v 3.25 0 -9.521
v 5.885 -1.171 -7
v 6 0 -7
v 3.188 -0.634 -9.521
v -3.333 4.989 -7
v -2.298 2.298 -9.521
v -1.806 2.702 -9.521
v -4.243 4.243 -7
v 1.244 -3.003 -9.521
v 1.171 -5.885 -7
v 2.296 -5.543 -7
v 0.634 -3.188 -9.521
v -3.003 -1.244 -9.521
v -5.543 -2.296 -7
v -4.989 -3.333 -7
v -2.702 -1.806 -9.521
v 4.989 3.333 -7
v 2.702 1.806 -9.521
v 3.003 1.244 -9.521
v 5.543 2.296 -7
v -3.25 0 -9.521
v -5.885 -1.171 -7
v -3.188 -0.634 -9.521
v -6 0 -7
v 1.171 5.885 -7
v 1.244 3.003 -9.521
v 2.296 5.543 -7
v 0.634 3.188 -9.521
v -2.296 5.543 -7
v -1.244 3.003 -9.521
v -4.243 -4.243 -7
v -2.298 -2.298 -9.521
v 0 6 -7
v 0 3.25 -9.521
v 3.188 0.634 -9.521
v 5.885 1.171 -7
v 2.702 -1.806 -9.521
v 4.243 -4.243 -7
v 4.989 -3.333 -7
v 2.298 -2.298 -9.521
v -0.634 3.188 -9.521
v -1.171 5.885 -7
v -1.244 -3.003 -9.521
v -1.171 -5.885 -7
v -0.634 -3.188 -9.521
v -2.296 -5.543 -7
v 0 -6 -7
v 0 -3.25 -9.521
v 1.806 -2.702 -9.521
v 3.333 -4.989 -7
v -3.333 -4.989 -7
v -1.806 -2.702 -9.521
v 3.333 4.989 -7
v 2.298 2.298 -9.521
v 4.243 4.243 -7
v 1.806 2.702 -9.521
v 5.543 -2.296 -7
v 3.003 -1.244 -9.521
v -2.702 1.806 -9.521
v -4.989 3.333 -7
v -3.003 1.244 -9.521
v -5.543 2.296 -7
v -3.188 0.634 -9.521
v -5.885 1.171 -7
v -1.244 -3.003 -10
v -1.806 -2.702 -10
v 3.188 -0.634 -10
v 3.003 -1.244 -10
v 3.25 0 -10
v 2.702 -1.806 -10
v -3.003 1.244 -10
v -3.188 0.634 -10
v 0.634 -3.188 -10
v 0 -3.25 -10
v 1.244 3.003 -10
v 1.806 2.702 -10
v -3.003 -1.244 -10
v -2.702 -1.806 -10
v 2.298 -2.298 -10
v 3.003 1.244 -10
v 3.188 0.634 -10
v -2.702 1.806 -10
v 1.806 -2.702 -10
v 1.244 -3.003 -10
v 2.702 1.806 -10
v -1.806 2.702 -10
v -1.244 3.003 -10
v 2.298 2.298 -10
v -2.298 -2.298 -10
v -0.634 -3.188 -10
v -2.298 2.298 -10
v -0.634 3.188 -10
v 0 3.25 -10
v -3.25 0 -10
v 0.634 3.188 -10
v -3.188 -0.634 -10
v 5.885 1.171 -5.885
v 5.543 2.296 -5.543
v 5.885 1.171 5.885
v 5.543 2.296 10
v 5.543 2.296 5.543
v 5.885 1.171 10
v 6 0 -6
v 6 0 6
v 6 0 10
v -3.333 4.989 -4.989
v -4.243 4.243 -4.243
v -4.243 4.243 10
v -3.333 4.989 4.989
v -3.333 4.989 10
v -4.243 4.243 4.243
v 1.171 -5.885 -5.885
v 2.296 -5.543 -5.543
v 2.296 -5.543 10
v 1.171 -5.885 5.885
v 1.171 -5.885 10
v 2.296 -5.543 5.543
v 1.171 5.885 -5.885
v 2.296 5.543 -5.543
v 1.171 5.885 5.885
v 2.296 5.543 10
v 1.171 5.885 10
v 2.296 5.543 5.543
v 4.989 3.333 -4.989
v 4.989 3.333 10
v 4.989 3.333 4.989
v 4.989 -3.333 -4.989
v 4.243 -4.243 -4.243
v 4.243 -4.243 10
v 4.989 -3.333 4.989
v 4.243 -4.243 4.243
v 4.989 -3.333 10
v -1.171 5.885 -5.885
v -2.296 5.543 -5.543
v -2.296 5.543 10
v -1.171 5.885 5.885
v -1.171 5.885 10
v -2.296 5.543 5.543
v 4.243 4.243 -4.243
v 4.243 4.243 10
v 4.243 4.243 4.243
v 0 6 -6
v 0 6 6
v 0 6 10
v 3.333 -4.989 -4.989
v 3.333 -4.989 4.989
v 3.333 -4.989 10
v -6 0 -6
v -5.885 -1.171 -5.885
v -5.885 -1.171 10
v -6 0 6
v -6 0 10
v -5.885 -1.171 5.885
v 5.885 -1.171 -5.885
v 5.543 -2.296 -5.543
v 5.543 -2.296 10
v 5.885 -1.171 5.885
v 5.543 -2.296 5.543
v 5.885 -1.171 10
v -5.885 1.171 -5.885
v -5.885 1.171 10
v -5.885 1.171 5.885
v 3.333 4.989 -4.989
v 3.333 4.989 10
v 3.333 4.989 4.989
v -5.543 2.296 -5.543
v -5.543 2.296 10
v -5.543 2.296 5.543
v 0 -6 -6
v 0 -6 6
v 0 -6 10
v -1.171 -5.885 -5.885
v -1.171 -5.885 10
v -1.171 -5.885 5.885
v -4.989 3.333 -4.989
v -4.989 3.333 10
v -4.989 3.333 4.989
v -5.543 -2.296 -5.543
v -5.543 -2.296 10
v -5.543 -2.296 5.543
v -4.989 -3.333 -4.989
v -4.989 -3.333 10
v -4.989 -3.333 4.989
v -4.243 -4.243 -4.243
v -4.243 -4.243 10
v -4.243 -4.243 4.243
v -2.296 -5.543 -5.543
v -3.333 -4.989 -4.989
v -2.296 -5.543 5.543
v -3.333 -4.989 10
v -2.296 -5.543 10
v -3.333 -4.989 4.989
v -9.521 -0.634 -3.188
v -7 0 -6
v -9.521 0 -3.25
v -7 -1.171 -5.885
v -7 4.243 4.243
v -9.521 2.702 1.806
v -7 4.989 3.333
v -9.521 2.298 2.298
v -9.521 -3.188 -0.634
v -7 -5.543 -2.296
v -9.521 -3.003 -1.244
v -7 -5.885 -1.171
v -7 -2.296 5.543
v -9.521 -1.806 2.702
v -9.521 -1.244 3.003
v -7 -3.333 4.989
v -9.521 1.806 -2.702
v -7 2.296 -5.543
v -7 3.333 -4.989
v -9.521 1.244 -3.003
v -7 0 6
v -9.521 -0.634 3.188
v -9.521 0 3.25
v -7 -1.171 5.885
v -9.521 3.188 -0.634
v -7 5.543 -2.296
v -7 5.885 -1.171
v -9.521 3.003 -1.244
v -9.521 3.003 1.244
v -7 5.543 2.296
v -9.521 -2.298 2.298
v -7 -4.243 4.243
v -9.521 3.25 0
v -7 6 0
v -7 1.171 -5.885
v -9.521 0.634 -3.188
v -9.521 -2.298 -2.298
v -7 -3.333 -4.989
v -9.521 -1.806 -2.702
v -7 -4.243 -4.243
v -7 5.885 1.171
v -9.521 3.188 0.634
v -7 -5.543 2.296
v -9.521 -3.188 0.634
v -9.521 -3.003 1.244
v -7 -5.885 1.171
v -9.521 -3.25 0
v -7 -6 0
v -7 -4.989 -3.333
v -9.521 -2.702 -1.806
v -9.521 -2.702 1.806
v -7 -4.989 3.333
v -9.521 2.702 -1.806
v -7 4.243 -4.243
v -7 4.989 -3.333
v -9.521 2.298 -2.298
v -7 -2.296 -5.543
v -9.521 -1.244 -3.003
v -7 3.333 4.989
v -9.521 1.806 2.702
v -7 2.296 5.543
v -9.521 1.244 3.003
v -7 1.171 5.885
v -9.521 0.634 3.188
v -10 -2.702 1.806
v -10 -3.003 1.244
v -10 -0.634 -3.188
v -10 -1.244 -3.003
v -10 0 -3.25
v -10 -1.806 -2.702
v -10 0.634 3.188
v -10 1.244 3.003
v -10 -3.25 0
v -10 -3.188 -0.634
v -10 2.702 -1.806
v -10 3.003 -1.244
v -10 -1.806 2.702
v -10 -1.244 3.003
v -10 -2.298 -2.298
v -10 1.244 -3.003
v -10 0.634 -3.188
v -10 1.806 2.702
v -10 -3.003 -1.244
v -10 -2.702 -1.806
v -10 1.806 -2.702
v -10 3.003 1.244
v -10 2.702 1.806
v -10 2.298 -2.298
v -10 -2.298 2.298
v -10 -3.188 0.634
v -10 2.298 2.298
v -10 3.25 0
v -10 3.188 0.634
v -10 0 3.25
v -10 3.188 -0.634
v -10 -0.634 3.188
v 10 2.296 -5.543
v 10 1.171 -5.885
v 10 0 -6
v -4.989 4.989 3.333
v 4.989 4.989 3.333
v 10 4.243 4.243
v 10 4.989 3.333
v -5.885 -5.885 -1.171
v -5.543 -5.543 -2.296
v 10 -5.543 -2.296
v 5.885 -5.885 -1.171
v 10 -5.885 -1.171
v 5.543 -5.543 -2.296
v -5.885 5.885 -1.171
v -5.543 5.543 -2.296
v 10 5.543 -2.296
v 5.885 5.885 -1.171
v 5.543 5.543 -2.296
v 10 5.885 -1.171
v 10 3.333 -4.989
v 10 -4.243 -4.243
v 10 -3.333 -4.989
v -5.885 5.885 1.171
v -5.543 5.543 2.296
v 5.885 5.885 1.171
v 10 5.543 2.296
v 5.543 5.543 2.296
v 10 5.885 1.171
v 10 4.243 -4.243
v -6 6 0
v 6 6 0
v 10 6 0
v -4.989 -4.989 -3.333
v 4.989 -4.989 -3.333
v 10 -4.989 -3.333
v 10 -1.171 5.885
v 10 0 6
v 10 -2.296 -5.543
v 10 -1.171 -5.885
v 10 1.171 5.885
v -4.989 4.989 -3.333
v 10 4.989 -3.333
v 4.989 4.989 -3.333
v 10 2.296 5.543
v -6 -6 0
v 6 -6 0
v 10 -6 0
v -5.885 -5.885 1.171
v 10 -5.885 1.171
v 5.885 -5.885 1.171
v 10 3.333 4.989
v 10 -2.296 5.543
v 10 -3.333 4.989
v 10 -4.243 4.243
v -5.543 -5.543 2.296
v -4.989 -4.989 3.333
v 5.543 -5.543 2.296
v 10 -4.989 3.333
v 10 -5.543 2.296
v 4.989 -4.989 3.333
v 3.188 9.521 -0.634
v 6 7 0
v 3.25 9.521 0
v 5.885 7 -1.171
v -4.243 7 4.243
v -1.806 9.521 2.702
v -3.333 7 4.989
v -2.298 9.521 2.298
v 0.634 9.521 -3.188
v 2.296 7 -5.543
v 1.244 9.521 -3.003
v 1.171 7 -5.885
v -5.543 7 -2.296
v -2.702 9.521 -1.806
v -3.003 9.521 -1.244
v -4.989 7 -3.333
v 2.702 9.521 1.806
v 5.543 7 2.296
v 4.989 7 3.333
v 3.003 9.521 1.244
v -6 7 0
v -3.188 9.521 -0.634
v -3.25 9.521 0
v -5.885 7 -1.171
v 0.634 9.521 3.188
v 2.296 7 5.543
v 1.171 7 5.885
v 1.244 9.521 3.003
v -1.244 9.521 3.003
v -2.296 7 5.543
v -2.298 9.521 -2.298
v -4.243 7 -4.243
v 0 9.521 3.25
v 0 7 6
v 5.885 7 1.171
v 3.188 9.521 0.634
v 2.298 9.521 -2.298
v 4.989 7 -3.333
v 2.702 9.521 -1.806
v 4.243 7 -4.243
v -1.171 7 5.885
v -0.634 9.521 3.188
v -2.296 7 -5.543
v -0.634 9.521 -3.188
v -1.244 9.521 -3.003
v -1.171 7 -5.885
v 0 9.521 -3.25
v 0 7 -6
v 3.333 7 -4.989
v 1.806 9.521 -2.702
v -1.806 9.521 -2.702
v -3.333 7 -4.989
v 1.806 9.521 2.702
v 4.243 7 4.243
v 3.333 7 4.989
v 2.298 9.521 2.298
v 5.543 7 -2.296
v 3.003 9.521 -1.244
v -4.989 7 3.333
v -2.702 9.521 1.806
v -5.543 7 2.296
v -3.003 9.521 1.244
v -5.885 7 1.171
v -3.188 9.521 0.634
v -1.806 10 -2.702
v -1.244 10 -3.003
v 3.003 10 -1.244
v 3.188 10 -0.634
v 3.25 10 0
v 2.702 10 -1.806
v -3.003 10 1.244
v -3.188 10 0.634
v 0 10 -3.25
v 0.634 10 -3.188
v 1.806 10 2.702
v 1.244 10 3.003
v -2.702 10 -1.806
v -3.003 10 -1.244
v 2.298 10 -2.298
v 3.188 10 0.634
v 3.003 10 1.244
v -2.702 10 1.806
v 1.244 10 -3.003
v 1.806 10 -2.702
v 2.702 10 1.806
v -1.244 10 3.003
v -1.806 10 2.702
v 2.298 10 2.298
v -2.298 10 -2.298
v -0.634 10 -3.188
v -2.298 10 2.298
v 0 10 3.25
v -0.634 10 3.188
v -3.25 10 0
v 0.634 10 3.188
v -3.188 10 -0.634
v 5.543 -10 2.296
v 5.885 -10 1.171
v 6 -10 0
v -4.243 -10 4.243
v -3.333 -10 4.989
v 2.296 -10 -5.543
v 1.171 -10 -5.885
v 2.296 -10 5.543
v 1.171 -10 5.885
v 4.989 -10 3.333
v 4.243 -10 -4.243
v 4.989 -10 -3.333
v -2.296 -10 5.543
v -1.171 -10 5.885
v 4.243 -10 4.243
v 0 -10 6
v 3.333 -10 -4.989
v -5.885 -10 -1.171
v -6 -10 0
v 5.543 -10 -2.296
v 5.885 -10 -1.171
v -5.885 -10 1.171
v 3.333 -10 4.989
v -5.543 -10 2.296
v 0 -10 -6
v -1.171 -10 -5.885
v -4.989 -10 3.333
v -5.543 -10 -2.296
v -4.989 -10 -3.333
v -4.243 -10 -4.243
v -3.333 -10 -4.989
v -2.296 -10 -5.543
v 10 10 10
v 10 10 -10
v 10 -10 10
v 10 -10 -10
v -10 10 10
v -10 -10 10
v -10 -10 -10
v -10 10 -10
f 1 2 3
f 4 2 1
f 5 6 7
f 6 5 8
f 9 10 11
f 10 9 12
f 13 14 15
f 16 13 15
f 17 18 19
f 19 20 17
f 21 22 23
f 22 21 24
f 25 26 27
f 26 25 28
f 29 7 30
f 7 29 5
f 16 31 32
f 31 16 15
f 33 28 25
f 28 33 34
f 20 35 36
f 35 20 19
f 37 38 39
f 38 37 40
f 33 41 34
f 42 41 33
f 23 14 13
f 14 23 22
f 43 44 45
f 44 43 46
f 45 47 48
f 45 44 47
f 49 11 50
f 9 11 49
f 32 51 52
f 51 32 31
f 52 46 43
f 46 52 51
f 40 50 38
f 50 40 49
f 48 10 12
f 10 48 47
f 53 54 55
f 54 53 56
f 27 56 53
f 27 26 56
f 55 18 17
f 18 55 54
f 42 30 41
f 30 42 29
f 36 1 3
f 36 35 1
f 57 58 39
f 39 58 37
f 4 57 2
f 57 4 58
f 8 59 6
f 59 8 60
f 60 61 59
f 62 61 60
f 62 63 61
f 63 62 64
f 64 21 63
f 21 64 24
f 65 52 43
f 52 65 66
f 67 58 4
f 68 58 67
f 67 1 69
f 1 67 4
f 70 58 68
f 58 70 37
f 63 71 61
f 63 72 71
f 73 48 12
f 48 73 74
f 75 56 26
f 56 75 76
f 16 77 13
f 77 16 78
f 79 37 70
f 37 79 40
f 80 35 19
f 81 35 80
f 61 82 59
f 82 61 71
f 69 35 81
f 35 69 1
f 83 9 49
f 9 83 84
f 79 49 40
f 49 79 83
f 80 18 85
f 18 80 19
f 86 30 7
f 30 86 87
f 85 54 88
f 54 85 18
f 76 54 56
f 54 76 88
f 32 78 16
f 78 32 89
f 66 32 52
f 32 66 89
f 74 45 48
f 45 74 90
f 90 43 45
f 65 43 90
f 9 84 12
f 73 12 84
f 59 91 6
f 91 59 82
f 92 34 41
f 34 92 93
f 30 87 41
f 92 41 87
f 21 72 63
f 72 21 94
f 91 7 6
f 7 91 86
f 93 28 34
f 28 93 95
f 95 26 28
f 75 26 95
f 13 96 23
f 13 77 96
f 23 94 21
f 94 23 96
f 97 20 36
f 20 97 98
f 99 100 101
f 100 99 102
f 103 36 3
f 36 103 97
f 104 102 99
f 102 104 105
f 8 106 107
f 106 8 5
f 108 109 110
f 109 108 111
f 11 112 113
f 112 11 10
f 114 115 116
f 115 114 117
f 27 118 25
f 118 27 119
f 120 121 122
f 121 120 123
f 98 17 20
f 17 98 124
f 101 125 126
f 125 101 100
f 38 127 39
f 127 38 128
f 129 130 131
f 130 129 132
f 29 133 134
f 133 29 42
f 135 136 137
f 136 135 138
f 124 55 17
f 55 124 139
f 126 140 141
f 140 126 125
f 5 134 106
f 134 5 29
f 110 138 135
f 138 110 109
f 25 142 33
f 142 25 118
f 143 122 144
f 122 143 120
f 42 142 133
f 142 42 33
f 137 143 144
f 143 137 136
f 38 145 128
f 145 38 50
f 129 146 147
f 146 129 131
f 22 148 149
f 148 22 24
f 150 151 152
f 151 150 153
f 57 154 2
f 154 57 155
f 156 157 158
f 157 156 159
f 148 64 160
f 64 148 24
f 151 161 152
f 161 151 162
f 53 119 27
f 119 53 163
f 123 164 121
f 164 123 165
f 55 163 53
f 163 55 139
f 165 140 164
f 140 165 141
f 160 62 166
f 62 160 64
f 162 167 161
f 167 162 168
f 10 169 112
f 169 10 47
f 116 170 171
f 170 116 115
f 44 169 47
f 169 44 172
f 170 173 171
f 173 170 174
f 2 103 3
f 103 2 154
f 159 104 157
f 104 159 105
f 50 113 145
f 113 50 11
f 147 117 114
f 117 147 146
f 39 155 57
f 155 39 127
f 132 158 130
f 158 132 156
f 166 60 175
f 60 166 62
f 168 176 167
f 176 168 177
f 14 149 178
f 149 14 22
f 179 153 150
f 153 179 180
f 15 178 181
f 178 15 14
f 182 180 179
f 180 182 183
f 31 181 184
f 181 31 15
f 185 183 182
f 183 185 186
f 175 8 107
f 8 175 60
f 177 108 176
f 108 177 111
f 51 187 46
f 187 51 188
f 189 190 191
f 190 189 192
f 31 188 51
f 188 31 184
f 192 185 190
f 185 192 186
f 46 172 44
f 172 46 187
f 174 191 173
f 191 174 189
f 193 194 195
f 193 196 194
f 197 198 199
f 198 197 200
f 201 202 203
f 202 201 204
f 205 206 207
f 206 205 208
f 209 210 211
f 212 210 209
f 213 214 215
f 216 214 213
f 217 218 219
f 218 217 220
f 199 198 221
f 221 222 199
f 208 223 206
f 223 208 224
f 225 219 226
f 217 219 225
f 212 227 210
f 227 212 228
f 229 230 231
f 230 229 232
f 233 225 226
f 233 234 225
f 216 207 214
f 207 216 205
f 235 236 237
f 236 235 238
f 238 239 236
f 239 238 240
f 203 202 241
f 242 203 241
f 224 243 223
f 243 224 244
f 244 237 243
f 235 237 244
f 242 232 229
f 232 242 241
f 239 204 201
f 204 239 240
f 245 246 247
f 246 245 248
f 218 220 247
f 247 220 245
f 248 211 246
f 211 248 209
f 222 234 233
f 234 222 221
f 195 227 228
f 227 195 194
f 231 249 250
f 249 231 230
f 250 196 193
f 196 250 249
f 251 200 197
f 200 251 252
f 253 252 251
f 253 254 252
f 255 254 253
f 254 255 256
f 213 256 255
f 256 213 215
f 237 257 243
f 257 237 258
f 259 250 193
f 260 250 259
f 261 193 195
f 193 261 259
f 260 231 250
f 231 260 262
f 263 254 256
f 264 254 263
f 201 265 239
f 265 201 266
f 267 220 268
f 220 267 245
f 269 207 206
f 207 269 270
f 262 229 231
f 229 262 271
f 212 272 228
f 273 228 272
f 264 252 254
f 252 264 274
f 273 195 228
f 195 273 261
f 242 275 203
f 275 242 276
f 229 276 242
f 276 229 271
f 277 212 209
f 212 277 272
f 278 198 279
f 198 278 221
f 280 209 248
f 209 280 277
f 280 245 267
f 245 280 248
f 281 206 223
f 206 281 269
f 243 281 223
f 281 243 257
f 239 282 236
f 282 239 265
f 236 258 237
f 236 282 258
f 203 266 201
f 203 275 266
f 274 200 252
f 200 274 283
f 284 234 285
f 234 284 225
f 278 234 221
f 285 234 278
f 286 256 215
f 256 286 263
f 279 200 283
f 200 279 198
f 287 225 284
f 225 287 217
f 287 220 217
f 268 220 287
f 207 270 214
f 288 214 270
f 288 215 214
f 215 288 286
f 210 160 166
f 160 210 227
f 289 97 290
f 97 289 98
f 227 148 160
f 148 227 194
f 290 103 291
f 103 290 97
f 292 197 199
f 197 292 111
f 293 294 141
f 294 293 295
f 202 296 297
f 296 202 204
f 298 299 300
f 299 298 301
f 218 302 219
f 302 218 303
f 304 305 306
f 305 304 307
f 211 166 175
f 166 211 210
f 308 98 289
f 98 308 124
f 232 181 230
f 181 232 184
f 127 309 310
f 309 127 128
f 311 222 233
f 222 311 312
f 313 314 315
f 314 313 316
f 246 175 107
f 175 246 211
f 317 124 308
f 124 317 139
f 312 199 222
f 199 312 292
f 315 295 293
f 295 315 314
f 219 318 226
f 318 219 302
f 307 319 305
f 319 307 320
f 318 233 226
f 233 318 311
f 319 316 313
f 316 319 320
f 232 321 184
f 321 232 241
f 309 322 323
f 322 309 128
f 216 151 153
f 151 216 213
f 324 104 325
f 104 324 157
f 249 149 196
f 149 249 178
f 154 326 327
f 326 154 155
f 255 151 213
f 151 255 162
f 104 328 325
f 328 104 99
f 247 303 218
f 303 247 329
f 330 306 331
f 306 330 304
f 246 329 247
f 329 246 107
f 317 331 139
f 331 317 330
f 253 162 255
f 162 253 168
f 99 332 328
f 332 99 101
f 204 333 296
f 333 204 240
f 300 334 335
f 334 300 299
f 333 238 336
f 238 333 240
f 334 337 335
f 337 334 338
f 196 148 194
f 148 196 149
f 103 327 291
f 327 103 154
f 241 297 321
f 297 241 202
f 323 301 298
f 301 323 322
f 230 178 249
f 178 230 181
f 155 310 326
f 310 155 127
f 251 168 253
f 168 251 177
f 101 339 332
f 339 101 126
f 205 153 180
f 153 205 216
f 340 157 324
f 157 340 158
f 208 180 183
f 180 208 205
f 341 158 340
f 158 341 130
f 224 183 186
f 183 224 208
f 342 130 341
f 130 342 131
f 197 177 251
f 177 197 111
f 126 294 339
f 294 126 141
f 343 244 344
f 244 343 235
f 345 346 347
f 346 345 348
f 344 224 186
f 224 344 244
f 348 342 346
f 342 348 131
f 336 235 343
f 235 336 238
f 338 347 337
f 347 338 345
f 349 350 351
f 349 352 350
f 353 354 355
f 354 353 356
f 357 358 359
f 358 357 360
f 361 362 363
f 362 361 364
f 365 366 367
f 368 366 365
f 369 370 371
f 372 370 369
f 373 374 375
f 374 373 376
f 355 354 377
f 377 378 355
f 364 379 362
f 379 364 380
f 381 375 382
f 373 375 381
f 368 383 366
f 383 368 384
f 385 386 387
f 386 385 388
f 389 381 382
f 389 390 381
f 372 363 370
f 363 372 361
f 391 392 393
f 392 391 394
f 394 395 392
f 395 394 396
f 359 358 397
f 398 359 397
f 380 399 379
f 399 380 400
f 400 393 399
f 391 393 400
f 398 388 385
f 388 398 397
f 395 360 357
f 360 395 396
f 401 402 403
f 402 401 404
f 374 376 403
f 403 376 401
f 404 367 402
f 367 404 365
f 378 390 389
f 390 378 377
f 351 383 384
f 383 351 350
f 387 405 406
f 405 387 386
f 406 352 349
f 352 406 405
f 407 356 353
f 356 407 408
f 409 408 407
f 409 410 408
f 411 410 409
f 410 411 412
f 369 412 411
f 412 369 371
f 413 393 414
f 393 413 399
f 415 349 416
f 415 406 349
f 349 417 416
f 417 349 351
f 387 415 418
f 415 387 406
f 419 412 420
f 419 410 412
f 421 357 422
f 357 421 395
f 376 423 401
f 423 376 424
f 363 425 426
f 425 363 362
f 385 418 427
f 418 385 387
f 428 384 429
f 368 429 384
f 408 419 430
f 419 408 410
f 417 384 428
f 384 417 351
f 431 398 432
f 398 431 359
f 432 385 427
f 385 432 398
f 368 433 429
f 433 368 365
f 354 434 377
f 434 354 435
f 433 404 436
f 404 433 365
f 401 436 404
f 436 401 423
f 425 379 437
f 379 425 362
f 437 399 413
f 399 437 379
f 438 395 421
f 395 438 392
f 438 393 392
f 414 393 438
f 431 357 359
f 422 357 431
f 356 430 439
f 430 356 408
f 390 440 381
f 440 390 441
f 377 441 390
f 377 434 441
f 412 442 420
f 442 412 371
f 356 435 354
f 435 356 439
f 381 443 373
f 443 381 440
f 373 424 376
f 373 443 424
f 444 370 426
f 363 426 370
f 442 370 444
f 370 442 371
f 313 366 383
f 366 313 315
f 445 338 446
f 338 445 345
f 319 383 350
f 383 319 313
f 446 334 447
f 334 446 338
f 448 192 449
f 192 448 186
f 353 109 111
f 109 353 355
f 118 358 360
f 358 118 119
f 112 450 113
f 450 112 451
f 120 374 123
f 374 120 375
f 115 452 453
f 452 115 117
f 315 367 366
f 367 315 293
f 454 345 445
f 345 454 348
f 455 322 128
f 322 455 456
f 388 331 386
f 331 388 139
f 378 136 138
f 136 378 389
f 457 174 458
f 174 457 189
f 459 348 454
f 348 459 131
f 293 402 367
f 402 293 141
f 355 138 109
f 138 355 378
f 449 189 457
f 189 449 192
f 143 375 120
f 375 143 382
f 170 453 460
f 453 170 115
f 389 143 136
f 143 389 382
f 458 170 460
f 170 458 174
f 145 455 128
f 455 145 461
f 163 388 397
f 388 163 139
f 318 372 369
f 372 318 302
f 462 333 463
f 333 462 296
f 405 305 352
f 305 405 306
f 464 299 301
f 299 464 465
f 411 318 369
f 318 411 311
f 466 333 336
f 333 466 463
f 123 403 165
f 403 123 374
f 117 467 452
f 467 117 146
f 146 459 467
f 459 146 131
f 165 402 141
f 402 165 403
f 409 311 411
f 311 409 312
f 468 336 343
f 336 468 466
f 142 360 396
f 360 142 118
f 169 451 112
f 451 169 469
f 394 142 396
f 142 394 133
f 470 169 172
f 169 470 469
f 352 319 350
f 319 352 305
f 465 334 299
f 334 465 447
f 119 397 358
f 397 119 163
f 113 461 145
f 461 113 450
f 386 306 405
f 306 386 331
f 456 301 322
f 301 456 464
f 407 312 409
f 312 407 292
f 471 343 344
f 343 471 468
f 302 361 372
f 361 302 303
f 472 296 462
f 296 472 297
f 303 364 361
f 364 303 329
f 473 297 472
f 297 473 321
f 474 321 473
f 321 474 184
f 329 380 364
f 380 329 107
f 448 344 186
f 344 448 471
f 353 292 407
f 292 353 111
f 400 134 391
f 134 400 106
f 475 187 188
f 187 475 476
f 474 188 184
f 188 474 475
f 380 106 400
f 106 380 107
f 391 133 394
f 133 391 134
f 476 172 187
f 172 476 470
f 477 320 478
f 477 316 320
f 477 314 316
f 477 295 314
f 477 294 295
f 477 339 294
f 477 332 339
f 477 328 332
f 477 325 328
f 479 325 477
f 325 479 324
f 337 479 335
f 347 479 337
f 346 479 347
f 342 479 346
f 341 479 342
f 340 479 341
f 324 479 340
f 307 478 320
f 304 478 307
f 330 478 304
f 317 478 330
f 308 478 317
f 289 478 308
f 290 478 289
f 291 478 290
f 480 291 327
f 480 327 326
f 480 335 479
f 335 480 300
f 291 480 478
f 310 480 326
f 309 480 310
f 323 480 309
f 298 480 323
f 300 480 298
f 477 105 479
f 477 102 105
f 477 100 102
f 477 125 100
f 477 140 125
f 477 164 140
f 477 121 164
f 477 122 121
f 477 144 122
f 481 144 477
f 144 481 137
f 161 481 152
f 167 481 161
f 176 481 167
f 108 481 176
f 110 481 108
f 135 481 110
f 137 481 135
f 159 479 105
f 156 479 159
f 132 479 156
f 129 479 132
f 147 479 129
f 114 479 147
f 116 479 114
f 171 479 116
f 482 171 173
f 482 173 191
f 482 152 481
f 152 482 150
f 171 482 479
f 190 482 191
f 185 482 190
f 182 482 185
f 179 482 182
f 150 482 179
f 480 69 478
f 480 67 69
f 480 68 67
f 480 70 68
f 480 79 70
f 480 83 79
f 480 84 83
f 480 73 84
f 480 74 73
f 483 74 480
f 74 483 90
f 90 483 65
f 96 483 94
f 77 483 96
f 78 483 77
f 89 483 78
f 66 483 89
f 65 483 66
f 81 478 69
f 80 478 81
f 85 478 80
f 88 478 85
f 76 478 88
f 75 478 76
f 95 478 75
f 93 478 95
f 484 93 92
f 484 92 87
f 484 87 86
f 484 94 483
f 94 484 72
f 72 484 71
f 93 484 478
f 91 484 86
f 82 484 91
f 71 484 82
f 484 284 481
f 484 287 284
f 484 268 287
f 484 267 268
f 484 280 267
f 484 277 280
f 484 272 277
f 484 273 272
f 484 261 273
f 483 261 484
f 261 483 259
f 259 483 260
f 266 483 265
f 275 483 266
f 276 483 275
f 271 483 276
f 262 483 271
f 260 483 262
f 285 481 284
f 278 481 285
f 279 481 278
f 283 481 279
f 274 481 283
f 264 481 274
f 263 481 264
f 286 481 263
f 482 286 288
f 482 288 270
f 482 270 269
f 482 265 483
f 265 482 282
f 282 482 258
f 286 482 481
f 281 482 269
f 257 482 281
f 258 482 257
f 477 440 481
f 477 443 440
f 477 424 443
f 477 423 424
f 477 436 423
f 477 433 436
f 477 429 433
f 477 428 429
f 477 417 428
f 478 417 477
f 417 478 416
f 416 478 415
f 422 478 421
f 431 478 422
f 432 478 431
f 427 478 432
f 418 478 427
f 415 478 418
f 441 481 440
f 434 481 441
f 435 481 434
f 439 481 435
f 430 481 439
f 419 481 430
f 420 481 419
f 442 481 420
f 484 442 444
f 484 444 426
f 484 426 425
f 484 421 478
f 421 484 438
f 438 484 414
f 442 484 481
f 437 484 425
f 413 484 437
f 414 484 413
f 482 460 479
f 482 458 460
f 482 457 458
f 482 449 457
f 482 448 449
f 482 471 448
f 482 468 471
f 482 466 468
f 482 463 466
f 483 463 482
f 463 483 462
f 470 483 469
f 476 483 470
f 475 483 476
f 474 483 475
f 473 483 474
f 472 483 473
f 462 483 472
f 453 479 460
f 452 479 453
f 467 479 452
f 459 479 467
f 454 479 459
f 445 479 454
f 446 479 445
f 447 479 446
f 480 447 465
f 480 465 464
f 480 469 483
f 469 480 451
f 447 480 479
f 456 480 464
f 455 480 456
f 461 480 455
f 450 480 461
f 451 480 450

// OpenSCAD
//
// From https://www.thingiverse.com/thing:1100779
// License: Creative Commons - Attribution license.
// Owner: https://www.thingiverse.com/woodywong/designs
// Video: https://youtu.be/buerT5AKOCM
// Copied from thingiverse.com files repo on 2025-10-03.
//

$fn = 32;

2020end ();

module 2020end (){
 difference (){
  cube ([20,20,20],center = true);
translate ([])
  cutout();
  rotate ([0,90,0])
   cutout ();
    rotate ([90,0,0])
   cutout ();
  
 } 
}

module cutout(){
 translate ([0,0,-7])
  rotate ([180,0,0])
  union () { 
   cylinder (d1=12,d2=0,h=5.5);
   cylinder (d=6.5,h=10);
   rotate ([180,0,0])
   cylinder (d=12,h=30);
 }
}
